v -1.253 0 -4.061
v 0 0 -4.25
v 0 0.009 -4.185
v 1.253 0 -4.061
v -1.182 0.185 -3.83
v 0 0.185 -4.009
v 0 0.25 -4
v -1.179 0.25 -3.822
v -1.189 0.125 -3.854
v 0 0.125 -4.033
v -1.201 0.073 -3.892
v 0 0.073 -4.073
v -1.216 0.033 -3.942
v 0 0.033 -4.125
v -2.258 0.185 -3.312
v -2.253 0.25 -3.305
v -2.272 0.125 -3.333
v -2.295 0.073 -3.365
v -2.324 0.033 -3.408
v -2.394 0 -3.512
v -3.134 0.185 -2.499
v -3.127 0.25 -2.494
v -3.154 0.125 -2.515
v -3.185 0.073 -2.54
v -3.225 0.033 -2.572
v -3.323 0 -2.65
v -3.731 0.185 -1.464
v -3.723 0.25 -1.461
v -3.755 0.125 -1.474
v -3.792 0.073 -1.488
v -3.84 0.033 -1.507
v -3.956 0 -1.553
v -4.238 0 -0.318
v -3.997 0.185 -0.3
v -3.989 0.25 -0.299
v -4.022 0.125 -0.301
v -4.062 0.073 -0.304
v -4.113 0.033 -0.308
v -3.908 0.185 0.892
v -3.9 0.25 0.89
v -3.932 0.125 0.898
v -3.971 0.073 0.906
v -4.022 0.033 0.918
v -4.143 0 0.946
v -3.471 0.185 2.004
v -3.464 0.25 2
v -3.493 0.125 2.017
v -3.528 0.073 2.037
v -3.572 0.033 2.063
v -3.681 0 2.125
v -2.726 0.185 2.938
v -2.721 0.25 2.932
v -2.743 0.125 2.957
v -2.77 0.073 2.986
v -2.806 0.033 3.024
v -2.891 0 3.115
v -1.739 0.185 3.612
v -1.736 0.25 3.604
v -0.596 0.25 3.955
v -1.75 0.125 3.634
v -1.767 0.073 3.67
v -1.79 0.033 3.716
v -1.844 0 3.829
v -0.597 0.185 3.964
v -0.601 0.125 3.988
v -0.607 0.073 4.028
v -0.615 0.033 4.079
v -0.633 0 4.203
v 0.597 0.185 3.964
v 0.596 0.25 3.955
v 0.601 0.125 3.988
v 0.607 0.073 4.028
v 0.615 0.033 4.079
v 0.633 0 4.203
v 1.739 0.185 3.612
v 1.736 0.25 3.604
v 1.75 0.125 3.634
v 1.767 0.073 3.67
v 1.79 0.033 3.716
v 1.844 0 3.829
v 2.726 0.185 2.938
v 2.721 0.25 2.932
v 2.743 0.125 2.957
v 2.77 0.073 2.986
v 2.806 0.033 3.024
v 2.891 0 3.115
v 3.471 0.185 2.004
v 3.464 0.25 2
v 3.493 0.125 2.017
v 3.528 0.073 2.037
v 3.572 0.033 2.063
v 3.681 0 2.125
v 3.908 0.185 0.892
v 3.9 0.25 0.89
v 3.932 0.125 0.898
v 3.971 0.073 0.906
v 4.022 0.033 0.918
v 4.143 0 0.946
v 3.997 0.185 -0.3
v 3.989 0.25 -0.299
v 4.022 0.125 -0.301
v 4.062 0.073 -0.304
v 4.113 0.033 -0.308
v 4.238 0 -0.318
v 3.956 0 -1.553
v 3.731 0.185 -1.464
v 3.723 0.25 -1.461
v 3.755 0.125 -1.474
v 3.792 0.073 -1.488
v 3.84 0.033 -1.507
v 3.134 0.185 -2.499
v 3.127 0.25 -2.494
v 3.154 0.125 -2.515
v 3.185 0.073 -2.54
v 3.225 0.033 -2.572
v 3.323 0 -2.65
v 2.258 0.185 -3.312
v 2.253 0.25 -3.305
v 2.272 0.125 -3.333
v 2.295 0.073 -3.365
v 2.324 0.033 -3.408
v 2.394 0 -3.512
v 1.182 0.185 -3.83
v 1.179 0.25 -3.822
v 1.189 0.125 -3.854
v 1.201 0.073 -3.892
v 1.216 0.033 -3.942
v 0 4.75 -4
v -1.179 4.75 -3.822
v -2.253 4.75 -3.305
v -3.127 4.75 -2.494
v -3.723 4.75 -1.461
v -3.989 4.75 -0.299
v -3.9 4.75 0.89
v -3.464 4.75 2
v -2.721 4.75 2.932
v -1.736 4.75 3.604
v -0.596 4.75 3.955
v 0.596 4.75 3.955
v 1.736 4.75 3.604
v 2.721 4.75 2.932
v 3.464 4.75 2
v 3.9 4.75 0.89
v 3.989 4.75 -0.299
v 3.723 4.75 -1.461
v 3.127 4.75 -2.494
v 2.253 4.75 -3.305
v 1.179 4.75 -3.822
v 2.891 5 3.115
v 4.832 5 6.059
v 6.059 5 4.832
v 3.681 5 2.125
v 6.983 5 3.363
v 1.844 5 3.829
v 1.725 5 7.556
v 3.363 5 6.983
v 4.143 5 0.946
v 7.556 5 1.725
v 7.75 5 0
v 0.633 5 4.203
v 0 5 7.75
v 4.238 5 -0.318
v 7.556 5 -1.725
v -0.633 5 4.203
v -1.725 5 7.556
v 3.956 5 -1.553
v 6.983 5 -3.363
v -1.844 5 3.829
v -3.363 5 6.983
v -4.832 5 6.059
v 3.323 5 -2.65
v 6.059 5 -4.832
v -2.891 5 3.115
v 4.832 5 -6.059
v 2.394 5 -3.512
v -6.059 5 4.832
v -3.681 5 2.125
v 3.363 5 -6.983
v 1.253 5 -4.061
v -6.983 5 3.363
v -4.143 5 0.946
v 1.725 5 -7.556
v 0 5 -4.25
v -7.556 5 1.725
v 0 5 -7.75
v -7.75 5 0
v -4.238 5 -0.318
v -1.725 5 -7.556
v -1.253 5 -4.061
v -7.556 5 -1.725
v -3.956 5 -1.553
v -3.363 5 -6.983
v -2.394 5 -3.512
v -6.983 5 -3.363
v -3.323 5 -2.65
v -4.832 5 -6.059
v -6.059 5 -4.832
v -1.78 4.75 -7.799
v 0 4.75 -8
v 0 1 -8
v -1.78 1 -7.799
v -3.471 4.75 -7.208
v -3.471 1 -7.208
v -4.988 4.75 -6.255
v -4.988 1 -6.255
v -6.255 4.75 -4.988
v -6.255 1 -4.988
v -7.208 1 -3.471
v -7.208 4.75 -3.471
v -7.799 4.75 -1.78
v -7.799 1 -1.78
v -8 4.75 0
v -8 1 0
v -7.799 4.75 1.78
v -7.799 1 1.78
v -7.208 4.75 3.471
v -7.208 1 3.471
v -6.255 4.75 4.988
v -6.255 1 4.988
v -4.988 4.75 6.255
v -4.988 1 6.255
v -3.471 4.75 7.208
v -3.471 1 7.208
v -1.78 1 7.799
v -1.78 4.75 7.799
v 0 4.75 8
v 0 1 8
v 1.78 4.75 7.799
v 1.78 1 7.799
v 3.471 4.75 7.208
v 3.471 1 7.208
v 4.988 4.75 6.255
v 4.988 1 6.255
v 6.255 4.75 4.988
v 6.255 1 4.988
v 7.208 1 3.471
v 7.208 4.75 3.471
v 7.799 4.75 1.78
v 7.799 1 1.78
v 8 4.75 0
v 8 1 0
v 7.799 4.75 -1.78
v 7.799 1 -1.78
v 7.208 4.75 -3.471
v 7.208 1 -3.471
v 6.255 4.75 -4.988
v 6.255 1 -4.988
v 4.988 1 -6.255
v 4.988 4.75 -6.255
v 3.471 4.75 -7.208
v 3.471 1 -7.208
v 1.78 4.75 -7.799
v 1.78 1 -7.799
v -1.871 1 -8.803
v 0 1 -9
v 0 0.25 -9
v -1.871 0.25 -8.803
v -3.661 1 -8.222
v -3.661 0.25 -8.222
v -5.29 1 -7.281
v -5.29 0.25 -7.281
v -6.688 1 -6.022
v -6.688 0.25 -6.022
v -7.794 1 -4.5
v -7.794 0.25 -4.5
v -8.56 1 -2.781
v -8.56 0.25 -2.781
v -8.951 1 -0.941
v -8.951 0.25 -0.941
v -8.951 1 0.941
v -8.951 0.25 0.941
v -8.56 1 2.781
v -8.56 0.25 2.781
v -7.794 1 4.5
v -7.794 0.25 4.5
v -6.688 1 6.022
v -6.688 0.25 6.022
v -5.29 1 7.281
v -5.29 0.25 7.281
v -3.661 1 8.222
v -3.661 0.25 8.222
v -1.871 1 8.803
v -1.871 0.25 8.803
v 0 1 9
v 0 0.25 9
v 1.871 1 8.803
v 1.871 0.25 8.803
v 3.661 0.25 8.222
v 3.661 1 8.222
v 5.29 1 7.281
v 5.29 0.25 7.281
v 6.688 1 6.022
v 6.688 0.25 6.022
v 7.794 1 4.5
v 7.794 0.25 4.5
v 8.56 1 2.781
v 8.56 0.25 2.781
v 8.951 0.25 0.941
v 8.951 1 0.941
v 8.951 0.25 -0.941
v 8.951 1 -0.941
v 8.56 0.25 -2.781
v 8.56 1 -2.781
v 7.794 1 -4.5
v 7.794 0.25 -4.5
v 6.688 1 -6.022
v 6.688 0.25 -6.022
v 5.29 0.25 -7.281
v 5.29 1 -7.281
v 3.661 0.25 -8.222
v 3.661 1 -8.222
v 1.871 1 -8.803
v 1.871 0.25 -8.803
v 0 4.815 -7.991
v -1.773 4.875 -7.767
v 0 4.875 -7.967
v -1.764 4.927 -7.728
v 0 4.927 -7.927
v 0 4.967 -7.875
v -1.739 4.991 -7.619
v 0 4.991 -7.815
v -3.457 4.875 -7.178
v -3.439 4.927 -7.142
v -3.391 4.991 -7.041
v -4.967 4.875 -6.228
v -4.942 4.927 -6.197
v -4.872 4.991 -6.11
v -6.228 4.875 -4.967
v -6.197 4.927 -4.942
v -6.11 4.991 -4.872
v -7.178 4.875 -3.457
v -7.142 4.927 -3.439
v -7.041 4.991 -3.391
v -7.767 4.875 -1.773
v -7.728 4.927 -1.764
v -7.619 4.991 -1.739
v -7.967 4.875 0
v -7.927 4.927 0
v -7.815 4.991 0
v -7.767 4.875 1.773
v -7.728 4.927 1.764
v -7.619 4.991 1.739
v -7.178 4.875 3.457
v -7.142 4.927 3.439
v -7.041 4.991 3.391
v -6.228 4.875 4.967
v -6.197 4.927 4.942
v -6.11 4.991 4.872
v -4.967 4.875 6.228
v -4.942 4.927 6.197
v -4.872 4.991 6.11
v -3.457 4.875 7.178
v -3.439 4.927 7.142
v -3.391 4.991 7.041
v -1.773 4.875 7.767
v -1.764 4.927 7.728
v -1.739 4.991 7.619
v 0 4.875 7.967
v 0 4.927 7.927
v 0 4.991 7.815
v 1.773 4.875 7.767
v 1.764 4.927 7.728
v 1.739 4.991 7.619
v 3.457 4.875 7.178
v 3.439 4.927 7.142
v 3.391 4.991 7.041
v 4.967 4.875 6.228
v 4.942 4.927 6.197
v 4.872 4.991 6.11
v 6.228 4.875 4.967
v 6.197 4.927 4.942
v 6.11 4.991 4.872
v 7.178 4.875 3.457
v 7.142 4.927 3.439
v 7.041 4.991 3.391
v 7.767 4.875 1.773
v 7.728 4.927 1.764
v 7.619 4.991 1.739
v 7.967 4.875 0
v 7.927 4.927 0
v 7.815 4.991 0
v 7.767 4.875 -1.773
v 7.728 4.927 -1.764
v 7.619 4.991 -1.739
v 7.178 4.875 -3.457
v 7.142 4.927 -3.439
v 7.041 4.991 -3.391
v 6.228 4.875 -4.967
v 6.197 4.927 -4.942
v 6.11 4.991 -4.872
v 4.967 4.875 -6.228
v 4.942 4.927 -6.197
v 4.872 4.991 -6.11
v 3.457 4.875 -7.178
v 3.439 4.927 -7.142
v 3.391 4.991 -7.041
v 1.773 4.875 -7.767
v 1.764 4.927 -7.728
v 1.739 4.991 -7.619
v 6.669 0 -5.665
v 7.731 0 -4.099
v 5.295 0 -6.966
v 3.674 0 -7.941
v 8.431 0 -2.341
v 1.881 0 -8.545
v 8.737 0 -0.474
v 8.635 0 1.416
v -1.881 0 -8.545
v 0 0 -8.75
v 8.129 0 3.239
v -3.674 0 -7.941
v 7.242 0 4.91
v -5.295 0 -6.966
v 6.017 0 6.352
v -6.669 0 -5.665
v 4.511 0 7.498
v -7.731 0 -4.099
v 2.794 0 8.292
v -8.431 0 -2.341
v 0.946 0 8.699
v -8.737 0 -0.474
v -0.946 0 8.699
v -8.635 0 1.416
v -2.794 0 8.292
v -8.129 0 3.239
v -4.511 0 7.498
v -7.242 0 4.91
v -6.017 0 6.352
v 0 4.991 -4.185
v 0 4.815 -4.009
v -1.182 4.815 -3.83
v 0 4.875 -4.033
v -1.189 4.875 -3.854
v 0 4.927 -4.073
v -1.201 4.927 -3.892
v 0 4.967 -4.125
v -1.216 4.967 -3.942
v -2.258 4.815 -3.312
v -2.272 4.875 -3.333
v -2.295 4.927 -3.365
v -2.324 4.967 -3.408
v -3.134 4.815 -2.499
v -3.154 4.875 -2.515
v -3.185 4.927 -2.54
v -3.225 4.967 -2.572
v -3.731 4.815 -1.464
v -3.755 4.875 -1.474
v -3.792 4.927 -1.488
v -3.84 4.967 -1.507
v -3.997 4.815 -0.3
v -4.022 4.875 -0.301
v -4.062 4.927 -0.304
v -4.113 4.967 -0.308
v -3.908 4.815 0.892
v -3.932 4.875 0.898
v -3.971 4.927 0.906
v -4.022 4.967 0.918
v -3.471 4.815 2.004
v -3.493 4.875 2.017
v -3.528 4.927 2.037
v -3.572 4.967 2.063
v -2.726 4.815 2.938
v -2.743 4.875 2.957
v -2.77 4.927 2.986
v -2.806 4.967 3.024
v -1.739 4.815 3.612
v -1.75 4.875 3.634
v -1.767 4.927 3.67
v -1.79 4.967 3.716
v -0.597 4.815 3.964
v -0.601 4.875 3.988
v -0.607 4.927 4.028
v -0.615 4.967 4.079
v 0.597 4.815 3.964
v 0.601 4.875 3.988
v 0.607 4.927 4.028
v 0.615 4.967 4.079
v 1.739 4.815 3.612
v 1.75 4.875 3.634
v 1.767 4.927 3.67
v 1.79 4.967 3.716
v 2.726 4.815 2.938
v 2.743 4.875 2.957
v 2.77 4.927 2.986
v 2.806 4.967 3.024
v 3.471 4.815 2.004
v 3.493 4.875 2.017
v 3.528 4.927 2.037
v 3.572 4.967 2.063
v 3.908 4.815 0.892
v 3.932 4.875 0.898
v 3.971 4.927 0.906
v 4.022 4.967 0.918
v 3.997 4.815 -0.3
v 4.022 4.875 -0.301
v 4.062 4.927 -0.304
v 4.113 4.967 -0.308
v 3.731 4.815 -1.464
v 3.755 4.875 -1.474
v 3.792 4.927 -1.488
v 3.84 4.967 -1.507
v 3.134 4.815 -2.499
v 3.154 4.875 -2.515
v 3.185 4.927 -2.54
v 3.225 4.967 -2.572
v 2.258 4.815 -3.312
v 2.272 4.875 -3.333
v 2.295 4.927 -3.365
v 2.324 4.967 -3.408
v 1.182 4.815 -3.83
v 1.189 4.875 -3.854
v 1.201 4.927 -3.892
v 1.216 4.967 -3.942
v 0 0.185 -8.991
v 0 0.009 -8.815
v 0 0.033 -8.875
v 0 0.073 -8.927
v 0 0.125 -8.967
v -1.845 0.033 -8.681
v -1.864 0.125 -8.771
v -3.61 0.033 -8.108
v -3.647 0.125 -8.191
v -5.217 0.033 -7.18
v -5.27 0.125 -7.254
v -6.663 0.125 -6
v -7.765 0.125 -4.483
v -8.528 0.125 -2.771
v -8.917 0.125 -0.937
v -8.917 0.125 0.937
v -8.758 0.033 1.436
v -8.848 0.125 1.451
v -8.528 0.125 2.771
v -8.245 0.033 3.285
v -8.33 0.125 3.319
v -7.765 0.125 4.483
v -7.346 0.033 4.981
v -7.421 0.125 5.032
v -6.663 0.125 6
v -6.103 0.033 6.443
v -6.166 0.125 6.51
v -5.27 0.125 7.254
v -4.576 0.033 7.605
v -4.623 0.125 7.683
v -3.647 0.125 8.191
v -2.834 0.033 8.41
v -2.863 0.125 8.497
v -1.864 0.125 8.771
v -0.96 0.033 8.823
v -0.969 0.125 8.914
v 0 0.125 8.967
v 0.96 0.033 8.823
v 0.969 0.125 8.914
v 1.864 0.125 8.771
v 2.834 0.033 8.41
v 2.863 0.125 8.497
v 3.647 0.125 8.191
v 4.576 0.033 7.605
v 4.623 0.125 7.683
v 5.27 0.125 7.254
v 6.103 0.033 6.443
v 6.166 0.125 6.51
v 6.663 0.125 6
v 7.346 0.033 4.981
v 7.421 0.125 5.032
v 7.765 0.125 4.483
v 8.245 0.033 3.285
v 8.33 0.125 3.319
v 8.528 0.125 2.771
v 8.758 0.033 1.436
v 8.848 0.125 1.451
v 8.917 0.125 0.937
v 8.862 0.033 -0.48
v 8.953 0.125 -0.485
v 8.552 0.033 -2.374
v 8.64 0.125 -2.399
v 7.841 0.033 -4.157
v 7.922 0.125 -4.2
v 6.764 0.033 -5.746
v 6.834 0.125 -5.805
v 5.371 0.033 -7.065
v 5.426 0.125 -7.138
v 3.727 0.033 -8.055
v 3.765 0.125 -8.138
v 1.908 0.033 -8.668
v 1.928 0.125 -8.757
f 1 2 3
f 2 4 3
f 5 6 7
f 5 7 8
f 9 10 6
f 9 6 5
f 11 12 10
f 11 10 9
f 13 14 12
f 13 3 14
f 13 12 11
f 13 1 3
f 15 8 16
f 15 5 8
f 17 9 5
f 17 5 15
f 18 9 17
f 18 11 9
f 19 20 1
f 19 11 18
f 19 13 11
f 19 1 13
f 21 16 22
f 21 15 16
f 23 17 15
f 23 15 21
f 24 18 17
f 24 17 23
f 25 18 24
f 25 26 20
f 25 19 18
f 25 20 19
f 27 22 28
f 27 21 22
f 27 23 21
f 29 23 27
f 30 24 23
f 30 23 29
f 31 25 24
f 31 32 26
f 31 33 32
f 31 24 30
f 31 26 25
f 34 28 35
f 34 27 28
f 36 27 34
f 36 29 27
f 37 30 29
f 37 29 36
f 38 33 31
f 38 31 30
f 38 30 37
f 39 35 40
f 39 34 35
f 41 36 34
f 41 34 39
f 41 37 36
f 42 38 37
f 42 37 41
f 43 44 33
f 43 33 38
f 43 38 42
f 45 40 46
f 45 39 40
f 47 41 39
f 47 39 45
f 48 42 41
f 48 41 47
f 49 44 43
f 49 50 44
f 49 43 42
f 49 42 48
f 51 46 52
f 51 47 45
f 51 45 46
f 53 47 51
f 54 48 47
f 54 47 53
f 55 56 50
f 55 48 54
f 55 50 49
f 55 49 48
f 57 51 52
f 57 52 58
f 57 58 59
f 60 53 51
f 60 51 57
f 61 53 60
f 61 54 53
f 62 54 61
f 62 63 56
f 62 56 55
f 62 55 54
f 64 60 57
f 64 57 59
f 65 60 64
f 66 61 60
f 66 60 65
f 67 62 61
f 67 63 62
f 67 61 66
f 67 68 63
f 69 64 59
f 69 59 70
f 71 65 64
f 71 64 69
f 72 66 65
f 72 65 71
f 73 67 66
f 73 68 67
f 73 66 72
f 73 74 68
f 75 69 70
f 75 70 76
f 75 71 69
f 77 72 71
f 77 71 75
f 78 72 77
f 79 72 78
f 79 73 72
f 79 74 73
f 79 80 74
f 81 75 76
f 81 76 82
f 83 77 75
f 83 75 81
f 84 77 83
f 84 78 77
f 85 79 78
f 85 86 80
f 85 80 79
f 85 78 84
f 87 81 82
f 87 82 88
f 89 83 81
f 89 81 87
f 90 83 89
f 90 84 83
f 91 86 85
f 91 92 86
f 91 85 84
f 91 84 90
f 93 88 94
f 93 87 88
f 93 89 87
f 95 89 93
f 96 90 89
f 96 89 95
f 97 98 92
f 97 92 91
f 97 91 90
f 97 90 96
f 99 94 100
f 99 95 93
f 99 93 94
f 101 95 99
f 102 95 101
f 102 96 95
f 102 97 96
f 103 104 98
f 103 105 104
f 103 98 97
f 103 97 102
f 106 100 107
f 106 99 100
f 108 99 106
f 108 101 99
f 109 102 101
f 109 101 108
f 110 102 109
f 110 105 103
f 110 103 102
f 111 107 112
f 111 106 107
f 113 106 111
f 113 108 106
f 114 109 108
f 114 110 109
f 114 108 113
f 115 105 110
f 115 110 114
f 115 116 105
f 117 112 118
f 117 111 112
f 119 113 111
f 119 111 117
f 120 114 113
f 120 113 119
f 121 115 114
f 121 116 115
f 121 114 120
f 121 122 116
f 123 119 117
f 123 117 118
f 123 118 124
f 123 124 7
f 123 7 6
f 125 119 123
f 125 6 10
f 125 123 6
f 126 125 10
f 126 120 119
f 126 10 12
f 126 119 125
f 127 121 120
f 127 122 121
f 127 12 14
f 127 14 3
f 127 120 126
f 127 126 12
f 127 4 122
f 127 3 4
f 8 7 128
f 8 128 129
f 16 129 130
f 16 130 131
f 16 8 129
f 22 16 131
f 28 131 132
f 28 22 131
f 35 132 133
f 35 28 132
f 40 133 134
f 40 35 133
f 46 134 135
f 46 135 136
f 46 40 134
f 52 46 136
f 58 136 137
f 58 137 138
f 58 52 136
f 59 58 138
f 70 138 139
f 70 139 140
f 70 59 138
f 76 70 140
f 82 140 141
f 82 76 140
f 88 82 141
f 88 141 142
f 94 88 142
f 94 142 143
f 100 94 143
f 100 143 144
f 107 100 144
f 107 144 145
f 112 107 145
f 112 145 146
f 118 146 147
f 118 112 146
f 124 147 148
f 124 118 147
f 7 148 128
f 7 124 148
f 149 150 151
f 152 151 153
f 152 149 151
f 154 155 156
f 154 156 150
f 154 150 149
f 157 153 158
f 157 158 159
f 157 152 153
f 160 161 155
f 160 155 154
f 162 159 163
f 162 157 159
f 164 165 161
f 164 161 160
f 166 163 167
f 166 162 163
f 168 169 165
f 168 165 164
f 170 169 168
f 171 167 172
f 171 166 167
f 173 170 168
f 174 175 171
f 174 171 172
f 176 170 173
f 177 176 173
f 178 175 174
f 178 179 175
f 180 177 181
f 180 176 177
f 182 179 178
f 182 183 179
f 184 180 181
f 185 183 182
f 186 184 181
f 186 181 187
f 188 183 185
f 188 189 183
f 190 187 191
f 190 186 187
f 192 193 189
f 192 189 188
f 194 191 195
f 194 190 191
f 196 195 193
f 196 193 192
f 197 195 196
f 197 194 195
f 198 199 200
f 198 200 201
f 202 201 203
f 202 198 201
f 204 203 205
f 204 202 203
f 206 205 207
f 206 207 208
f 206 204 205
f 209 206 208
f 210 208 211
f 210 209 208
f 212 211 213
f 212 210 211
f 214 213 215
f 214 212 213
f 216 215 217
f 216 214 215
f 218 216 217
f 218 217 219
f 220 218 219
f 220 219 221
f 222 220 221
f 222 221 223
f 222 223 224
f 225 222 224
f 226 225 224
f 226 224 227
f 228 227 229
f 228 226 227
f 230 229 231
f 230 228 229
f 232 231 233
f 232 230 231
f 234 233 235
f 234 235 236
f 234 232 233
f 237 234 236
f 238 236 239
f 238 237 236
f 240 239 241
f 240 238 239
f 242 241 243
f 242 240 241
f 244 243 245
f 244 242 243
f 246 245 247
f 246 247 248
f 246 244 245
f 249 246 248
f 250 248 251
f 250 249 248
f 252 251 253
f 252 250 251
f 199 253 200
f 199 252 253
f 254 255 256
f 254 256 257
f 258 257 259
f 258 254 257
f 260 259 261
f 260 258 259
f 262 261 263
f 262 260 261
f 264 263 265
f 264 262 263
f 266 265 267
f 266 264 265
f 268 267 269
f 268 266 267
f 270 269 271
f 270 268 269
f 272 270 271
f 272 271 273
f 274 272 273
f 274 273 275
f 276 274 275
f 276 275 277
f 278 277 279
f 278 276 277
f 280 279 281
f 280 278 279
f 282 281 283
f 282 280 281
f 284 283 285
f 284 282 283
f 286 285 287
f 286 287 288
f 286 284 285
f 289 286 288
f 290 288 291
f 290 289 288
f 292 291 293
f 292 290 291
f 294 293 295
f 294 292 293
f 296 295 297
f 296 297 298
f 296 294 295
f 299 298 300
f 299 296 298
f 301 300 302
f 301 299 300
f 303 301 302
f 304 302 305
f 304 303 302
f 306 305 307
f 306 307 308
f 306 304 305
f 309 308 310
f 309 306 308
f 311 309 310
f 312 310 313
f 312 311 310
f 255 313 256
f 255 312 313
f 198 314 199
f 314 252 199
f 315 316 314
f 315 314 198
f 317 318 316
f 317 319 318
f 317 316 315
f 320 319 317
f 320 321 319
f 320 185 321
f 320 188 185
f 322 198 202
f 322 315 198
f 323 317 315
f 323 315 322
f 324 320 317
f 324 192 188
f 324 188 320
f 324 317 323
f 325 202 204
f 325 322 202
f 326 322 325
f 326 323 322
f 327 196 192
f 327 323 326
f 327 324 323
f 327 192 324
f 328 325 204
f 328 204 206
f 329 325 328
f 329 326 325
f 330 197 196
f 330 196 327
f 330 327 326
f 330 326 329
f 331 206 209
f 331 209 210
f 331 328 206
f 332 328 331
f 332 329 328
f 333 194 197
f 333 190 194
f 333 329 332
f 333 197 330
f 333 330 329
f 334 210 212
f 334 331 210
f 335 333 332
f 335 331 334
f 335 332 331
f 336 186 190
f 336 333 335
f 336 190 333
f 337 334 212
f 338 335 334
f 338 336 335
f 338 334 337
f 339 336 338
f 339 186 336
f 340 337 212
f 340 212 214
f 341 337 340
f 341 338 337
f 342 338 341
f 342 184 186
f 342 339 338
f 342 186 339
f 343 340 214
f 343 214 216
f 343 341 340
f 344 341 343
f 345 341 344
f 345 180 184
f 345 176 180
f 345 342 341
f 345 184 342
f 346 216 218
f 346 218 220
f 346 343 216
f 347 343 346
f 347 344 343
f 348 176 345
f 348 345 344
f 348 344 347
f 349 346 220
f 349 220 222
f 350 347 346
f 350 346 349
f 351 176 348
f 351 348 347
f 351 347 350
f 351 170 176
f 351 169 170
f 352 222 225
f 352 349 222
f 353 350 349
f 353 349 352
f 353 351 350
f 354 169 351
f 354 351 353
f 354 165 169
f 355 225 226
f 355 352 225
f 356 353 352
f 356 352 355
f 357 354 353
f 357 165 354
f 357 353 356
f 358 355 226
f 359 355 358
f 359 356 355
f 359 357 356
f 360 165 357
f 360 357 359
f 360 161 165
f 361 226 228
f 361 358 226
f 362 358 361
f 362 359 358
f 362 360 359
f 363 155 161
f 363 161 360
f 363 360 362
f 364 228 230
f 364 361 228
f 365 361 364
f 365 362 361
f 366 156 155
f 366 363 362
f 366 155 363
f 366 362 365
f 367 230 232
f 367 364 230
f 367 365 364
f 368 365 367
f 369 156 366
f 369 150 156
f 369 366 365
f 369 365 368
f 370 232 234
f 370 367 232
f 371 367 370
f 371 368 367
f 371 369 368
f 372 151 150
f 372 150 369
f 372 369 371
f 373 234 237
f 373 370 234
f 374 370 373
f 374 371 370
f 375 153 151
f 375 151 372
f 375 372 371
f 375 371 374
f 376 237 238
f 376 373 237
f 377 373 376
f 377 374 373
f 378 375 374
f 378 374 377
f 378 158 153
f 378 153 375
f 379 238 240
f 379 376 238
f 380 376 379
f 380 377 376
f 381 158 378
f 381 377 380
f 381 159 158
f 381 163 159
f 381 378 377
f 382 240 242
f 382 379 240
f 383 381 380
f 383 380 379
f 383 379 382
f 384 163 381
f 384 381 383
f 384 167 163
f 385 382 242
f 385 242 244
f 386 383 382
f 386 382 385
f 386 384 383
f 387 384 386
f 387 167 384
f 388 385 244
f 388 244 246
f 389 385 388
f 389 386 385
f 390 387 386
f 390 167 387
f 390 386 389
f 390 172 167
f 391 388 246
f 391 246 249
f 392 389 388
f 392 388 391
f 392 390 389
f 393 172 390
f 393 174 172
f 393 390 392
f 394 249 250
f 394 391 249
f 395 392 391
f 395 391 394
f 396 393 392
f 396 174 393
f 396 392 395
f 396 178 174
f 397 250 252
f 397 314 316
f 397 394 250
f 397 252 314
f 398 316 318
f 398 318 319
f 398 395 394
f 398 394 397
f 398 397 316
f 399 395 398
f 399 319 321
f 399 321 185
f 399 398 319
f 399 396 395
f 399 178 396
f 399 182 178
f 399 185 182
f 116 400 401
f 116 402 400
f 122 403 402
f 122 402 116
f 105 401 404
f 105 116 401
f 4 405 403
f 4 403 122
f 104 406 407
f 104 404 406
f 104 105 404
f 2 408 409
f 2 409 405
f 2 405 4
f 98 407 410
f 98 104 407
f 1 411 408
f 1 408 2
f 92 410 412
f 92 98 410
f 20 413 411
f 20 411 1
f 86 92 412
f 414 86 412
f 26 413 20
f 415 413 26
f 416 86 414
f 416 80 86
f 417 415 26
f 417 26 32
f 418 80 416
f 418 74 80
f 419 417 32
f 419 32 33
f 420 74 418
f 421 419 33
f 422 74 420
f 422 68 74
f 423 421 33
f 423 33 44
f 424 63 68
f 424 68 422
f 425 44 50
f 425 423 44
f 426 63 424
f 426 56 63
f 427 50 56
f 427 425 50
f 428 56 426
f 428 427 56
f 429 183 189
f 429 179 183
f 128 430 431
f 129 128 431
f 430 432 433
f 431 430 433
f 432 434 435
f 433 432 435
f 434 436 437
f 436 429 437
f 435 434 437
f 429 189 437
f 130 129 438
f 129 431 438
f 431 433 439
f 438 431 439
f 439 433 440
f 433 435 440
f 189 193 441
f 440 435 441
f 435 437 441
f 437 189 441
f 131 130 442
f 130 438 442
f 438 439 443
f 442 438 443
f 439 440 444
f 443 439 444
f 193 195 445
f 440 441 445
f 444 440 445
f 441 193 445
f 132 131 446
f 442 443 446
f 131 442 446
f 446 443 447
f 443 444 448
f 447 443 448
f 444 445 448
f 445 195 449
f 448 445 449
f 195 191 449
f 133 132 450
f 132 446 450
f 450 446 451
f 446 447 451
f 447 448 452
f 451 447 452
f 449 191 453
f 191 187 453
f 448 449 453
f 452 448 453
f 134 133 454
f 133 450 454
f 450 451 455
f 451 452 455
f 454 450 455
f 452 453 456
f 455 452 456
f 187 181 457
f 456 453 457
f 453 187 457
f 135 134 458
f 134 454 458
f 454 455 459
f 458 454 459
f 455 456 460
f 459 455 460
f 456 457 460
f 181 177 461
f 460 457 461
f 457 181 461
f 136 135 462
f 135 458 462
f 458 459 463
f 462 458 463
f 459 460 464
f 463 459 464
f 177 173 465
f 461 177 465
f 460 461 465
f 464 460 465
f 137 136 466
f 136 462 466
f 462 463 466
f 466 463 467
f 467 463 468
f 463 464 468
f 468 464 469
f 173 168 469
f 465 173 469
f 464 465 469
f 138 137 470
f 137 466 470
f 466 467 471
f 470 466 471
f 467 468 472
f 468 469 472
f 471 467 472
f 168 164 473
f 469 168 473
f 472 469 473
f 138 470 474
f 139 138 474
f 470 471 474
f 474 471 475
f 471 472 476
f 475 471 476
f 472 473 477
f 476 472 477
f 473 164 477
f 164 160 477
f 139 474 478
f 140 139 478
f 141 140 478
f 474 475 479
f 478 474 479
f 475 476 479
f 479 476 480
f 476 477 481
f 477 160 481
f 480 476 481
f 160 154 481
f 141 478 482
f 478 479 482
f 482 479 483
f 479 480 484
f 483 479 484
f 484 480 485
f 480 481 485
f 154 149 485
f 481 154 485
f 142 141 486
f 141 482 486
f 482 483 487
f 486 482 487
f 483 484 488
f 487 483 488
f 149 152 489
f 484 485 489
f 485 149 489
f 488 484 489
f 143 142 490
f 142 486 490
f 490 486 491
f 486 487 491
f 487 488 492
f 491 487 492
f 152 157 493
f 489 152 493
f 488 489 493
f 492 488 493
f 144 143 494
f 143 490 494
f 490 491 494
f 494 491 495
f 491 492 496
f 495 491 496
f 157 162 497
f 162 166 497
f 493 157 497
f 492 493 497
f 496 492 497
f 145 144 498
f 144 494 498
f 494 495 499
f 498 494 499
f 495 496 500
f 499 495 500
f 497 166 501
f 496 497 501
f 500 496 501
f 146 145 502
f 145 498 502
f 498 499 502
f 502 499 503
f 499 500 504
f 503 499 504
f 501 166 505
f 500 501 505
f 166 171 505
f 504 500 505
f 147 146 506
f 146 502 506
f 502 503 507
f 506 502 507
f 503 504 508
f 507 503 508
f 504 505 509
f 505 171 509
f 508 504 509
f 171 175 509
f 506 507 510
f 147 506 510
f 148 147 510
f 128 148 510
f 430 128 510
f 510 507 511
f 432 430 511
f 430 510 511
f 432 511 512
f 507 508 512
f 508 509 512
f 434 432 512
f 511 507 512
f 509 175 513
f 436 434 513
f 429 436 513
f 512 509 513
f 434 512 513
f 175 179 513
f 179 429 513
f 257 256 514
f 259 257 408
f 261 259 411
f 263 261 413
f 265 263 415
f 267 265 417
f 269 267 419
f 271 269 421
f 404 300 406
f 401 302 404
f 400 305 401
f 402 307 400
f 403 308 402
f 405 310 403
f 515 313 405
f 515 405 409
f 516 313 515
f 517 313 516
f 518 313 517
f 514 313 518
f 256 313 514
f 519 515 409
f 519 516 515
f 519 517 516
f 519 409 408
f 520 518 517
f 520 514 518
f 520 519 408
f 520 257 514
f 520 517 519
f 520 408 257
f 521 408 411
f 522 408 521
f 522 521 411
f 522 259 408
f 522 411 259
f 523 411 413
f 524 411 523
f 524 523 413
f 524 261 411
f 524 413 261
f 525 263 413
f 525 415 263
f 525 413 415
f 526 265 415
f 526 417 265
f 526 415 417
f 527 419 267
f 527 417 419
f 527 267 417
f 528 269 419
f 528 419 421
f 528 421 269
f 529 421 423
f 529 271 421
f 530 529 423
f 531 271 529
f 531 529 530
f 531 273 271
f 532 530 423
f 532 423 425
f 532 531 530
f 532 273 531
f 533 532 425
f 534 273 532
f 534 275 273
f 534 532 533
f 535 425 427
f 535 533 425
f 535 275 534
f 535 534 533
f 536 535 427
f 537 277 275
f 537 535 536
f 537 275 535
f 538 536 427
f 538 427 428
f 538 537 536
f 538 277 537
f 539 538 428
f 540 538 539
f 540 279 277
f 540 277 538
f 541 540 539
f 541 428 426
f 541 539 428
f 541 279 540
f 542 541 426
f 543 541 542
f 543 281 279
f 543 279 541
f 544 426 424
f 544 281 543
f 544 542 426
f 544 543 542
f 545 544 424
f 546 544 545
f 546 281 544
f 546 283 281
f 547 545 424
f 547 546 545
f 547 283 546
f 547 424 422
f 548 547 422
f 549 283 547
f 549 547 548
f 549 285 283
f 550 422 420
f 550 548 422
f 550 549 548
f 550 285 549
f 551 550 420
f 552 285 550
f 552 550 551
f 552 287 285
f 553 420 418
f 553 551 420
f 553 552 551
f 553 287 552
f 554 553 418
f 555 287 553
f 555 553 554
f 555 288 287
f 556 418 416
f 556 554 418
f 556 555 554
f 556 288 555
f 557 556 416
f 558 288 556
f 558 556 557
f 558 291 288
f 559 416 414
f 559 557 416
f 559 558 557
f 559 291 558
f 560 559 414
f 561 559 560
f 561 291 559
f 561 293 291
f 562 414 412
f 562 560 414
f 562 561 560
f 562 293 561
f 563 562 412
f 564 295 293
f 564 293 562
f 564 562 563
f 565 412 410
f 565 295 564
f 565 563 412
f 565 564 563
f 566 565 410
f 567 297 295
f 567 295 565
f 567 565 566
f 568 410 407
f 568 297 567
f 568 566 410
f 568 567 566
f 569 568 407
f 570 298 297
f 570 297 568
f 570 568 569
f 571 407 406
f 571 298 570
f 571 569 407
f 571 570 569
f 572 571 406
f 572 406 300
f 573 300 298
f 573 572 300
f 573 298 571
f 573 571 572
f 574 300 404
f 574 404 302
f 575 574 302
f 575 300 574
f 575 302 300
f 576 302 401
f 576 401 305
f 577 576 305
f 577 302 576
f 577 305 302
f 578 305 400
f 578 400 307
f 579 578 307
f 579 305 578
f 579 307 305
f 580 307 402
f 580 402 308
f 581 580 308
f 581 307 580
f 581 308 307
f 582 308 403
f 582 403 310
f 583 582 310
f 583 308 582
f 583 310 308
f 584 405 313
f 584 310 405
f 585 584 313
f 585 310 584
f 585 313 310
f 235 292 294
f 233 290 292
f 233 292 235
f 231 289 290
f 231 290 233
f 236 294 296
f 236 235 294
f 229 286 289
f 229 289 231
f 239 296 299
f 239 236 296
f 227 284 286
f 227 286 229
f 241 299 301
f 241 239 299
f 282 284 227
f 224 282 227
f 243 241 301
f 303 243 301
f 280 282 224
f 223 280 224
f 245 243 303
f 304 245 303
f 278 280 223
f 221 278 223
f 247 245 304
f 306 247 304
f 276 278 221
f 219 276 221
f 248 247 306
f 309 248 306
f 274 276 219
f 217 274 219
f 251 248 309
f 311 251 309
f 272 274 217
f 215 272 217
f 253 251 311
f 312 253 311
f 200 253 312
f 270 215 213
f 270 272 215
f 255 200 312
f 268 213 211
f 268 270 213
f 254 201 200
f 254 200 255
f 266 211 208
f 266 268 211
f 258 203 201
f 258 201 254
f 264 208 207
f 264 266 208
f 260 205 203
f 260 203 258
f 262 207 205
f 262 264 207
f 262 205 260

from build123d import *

# Parameters (mm, degrees)
CONG_1_R = 0.25


with BuildPart() as part:
    # Esquisse1 → Révolution1 (revolve)
    with BuildSketch(Plane.XY, mode=Mode.PRIVATE) as r_volution1_sk:
        Polygon((4, 5), (4, 0), (9, 0), (9, 1), (8, 1), (8, 5), align=None)
    revolve(r_volution1_sk.sketch.rotate(Axis((0, 0, 0), (0, 1, 0)), 90), axis=Axis((0, 0, 0), (0, 1, 0)))

    # Congé1
    cong_1_edges = [part.edges().sort_by_distance(p)[0] for p in [
        (0, 5, 8),
        (0, 0, 9),
        (0, 0, 4),
        (0, 5, 4),
    ]]
    fillet(cong_1_edges, radius=CONG_1_R)


solid = part.part
